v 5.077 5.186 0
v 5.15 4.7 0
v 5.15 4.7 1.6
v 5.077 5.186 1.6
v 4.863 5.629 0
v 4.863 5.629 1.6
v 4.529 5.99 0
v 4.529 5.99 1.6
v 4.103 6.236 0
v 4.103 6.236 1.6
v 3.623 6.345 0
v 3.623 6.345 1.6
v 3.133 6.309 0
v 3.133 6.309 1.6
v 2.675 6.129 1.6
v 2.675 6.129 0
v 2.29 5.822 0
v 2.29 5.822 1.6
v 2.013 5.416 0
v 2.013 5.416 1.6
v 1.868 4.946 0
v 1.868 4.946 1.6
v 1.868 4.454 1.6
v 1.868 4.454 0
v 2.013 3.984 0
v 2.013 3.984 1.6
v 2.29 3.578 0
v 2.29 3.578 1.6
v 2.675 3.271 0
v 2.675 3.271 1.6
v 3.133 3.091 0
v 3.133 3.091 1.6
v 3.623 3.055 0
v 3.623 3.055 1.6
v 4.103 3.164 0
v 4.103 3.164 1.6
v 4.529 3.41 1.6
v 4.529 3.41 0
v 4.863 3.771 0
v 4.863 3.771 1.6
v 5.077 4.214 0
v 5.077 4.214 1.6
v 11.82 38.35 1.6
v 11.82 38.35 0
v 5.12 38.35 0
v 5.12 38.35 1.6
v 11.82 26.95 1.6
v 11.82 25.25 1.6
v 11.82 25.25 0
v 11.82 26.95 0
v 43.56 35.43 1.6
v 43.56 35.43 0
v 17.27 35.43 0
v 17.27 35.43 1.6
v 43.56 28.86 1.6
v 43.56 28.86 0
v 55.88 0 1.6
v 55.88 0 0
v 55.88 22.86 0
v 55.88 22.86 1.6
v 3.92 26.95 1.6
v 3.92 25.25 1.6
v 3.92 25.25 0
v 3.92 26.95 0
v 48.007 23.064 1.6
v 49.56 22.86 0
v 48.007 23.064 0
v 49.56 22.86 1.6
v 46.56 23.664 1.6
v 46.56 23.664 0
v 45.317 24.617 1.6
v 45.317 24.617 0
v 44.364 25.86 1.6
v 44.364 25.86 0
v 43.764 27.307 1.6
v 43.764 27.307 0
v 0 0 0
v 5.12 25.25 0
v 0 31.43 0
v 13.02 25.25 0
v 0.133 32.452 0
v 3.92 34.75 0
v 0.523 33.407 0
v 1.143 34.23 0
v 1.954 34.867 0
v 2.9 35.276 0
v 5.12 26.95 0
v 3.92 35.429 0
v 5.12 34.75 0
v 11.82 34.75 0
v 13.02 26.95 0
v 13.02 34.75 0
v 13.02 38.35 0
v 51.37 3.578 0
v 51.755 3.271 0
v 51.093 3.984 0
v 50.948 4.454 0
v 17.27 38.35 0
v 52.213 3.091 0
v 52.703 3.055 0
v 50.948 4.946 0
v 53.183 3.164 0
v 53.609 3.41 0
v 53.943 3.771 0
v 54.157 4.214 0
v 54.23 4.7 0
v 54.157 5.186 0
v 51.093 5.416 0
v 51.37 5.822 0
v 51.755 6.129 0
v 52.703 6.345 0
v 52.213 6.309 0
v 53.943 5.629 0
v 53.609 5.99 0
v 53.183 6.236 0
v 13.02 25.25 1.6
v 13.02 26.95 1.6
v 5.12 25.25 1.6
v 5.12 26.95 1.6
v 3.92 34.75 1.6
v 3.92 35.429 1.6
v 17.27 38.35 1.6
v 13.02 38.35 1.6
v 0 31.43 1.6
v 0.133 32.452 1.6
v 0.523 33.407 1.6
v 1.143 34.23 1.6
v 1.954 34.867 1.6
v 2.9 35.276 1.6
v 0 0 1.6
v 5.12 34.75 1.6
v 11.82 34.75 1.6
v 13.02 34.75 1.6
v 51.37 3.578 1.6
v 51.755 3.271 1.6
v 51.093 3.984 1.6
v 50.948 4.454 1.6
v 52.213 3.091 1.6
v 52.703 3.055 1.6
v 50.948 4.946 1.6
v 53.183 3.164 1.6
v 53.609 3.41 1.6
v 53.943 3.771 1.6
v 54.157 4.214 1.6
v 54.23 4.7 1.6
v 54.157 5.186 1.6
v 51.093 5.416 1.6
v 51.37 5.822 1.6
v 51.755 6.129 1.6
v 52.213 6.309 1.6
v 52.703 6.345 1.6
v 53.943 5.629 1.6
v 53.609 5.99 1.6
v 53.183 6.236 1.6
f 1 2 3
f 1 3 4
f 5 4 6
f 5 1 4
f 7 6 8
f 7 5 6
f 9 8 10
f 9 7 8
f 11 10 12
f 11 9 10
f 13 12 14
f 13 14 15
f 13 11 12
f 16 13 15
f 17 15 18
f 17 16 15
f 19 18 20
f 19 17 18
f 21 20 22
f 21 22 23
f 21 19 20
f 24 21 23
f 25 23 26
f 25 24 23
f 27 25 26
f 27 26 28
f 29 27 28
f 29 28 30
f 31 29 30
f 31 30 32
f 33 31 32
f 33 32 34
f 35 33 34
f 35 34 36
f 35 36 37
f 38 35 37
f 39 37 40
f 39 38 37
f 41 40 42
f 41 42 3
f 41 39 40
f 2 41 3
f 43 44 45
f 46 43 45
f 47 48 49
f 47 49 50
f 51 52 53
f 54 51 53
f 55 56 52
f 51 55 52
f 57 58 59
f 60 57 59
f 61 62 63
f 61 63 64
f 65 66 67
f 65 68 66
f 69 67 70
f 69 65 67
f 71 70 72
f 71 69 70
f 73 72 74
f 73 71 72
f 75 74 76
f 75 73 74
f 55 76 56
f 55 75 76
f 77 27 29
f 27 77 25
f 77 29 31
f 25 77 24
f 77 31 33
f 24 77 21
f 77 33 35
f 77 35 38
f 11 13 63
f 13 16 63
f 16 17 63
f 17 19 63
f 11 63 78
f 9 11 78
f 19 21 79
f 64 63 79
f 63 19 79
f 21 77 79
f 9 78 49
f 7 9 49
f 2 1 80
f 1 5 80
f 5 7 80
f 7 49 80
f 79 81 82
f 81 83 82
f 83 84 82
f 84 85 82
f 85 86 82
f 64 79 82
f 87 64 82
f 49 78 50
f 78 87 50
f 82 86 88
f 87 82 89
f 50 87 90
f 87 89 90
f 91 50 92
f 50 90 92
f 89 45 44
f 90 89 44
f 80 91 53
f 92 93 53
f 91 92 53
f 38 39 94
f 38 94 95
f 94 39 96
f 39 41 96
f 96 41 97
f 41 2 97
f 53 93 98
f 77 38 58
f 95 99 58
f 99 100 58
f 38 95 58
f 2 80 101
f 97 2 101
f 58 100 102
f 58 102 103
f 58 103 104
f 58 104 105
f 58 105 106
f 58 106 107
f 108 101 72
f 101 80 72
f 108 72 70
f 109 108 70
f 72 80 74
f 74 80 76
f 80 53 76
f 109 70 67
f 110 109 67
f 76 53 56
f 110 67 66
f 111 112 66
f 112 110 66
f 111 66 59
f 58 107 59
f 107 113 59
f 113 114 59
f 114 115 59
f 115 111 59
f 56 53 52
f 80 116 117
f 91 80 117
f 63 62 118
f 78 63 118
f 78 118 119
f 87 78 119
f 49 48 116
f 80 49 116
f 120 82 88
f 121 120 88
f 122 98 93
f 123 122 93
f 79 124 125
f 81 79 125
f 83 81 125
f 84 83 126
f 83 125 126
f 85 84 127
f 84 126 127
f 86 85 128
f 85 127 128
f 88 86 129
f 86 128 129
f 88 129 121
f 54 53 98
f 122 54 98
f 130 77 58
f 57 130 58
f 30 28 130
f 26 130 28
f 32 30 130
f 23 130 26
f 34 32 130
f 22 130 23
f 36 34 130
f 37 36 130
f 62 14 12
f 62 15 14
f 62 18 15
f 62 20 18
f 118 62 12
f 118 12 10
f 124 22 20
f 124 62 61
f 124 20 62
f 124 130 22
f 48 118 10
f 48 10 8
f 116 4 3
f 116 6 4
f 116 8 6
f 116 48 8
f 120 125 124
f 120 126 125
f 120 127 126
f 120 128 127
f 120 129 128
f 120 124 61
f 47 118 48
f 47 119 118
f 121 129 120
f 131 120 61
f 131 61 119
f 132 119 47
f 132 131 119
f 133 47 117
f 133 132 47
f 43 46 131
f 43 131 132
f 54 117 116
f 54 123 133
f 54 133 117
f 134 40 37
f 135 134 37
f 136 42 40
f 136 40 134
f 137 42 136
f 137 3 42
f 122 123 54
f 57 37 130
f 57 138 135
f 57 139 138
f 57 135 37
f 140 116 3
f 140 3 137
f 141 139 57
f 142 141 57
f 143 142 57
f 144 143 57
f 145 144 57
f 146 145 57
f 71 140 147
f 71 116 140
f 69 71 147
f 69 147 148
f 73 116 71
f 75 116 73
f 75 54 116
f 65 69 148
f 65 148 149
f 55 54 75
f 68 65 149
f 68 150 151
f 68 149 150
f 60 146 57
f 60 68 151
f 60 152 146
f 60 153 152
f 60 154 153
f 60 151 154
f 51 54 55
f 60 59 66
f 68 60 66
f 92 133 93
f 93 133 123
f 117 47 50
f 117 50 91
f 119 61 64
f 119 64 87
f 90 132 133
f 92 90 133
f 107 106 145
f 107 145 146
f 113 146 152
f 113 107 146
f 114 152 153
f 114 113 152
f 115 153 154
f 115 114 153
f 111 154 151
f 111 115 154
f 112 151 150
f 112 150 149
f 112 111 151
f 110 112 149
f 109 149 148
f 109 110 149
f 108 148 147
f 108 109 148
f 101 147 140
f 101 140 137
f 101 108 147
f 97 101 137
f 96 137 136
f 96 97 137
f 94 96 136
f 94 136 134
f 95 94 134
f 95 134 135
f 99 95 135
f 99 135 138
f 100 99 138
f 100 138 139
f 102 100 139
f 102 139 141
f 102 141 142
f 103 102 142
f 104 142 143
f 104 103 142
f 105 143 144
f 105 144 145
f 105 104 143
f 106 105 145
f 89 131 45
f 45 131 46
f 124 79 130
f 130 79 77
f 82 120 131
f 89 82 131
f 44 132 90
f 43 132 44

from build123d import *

# Parameters (mm, degrees)
F0_R     = 1.65
F1_DEPTH = 1.6
F2_R     = 4
F3_R     = 6
F4_W     = 1.2
F4_H     = 3.6
F4_H_2   = 1.7
F5_DEPTH = 1.601


with BuildPart() as f1:
    # F0 (on Top) → F1 (new body)
    with BuildSketch(Plane.XY):
        Polygon((0, 35.43), (0, 0), (55.88, 0), (55.88, 22.86), (43.56, 22.86), (43.56, 35.43), (17.27, 35.43), (17.27, 38.35), (4.57, 38.35), (4.57, 35.43), align=None)
        with Locations((3.5, 4.7)):
            Circle(F0_R, mode=Mode.SUBTRACT)
        with Locations((52.58, 4.7)):
            Circle(F0_R, mode=Mode.SUBTRACT)
    extrude(amount=F1_DEPTH)

    # F2
    f2_edges = [f1.edges().sort_by_distance(p)[0] for p in [
        (0, 35.43, 0.8),
    ]]
    fillet(f2_edges, radius=F2_R)

    # F3
    f3_edges = [f1.edges().sort_by_distance(p)[0] for p in [
        (43.56, 22.86, 0.8),
    ]]
    fillet(f3_edges, radius=F3_R)

    # F4 (on face) → F5 (cut, through all)
    with BuildSketch(Plane.XY.offset(1.6)):
        with Locations((4.52, 36.55)):
            Rectangle(F4_W, F4_H)
        with Locations((12.42, 36.55)):
            Rectangle(F4_W, F4_H)
        with Locations((4.52, 26.1)):
            Rectangle(F4_W, F4_H_2)
        with Locations((12.42, 26.1)):
            Rectangle(F4_W, F4_H_2)
    extrude(amount=-F5_DEPTH, mode=Mode.SUBTRACT)


solid = f1.part
